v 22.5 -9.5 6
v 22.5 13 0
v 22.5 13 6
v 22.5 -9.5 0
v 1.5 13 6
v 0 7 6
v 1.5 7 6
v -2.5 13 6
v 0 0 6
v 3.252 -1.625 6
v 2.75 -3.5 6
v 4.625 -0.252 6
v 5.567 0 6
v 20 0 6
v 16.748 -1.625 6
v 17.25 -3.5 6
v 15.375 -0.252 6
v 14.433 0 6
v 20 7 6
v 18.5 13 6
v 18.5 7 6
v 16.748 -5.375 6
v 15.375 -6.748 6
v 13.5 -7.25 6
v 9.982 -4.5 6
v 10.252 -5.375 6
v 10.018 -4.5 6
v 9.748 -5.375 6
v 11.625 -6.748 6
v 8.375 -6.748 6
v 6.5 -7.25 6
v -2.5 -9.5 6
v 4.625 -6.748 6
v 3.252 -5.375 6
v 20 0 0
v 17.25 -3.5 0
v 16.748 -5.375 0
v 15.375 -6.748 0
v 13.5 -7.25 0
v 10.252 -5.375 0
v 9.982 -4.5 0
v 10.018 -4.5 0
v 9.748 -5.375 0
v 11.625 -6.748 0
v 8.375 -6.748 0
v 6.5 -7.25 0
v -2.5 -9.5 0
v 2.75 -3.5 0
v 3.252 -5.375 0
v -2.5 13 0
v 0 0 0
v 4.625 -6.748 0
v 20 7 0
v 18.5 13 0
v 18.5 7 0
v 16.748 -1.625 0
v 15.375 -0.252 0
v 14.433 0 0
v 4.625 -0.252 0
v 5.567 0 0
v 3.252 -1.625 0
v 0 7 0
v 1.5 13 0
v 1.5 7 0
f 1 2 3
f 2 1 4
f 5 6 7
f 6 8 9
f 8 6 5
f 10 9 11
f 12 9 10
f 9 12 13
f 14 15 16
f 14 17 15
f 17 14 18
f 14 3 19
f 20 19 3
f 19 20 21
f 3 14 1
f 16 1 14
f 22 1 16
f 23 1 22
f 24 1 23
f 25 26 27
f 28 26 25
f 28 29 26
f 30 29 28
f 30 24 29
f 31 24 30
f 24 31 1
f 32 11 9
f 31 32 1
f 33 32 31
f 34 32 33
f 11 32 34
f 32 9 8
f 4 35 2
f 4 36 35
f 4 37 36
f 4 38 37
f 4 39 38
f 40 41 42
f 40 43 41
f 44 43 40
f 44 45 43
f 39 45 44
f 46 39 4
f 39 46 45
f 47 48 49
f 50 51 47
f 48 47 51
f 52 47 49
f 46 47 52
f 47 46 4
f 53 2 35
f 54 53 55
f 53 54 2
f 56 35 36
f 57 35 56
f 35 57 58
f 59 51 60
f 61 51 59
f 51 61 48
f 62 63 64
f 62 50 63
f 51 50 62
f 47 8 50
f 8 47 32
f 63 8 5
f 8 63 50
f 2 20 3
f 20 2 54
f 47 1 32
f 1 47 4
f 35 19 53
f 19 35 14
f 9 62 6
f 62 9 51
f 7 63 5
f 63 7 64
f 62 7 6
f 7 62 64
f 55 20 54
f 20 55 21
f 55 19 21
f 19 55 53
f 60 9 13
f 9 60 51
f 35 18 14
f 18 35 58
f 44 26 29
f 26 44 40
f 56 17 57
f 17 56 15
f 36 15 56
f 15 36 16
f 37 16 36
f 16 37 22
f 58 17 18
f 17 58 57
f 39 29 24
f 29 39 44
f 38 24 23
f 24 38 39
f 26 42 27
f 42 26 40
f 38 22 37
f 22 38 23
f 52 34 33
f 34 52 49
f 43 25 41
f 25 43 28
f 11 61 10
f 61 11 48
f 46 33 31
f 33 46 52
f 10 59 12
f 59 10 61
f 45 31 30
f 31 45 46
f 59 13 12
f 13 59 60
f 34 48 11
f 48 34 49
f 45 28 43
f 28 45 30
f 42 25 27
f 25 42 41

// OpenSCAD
difference() {
union() { translate([0,-7,0]) difference() {
translate([-2.5,-2.5,0]) cube([20+2.5*2,20+2.5,6]);
cube([20,200,6]);
}
translate([0,(20-6)/2,0]) cube([1.5,6,6]);
translate([20-1.5,(20-6)/2,0]) cube([1.5,6,6]);
translate([0,-7,0]) cube([20,7,6]);
//translate([0,-7,0]) cube([(20-7*2)/2,7,6]);
//translate([20-(20-7*2)/2,-7,0]) cube([(20-7*2)/2,7,6]);
}

o=0.5;
translate([20/2+7/2,-7/2,0]) cylinder(r=(7+o)/2, h=6);
translate([20/2-7/2,-7/2,0]) cylinder(r=(7+o)/2, h=6);
w=6;
translate([20/2-w/2,-7+5/2,0]) cube([w,5,6]);
}
